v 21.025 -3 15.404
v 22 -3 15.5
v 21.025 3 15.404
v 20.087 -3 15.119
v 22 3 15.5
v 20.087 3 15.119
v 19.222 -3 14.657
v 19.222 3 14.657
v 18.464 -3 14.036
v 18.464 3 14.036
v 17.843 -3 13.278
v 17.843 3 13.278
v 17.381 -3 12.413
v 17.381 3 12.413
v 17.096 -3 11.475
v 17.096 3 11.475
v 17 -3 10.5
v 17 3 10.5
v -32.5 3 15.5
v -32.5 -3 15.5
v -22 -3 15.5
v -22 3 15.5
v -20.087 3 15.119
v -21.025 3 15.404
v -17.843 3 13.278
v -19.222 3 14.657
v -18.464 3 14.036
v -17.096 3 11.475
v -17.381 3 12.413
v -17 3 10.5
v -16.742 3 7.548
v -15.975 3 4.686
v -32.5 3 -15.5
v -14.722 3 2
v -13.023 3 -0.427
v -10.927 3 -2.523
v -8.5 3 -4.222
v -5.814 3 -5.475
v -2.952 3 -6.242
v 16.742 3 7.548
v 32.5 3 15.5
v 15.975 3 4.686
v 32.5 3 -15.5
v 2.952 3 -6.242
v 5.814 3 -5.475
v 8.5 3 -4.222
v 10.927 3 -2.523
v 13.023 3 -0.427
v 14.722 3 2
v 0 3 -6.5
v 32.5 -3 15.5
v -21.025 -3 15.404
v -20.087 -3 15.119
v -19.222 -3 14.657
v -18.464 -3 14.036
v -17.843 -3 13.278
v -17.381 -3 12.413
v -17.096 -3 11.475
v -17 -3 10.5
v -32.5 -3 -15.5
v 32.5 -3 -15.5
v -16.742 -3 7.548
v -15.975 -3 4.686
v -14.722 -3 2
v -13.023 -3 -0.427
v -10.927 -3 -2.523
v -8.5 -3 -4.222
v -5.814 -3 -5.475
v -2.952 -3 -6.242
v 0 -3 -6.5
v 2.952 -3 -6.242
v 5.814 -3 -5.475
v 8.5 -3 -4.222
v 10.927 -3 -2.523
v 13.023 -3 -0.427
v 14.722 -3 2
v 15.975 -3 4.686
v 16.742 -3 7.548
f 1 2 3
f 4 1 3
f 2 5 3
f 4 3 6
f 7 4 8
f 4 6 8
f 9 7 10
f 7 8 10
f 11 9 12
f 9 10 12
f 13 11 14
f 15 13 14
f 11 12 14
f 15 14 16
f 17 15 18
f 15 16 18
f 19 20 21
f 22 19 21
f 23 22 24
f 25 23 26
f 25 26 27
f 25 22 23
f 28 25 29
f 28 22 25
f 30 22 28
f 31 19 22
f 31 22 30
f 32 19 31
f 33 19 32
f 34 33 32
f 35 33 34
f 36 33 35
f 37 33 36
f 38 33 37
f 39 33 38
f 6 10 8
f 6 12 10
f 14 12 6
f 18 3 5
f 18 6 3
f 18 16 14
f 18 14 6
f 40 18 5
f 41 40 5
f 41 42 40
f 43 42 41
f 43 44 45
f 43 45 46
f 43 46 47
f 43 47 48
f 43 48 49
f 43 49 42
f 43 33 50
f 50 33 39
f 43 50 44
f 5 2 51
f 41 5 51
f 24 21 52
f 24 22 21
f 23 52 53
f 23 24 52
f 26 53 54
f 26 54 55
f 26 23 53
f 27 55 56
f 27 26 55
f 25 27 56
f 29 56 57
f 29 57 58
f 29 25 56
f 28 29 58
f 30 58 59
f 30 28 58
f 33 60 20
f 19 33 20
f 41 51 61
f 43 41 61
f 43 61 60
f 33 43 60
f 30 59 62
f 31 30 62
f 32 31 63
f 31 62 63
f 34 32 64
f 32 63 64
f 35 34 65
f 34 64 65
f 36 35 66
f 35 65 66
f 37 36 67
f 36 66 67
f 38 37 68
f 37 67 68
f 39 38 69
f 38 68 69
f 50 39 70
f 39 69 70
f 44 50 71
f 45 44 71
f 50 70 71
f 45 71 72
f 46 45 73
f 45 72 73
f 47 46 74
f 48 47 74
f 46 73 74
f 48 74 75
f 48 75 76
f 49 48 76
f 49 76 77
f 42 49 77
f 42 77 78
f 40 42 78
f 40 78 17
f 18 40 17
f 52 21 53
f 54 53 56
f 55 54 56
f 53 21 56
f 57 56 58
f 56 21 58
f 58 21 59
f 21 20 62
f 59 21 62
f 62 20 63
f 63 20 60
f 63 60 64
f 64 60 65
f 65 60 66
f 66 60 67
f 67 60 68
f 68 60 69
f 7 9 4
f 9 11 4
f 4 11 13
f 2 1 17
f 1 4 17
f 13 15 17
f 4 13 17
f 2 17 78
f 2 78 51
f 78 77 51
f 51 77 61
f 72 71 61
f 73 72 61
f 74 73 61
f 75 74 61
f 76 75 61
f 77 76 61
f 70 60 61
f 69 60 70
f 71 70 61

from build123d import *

# Parameters (mm, degrees)
BOSS_EXTRUDE1_DEPTH      = 3
BOSS_EXTRUDE1_DEPTH_BACK = 3
FILLET1_R                = 5


with BuildPart() as part:
    # Sketch1 → Boss-Extrude1 (new, two sides: drawn at the far end of the back side and taken through both)
    with BuildSketch(Plane(origin=(0, 0, 0), x_dir=(1, 0, 0), z_dir=(0, 1, 0)).offset(-BOSS_EXTRUDE1_DEPTH_BACK)):
        with BuildLine():
            Line((16.248076809, -15.5), (32.5, -15.5))
            Line((32.5, -15.5), (32.5, 15.5))
            Line((32.5, 15.5), (-32.5, 15.5))
            Line((-32.5, 15.5), (-32.5, -15.5))
            Line((-32.5, -15.5), (-16.248076809, -15.5))
            ThreePointArc((-16.248076809, -15.5), (0, 6.5), (16.248076809, -15.5))
        make_face()
    extrude(amount=BOSS_EXTRUDE1_DEPTH + BOSS_EXTRUDE1_DEPTH_BACK)

    # Fillet1
    fillet1_edges = [part.edges().sort_by_distance(p)[0] for p in [
        (16.248076809, 0, 15.5),
        (-16.248076809, 0, 15.5),
    ]]
    fillet(fillet1_edges, radius=FILLET1_R)


solid = part.part
